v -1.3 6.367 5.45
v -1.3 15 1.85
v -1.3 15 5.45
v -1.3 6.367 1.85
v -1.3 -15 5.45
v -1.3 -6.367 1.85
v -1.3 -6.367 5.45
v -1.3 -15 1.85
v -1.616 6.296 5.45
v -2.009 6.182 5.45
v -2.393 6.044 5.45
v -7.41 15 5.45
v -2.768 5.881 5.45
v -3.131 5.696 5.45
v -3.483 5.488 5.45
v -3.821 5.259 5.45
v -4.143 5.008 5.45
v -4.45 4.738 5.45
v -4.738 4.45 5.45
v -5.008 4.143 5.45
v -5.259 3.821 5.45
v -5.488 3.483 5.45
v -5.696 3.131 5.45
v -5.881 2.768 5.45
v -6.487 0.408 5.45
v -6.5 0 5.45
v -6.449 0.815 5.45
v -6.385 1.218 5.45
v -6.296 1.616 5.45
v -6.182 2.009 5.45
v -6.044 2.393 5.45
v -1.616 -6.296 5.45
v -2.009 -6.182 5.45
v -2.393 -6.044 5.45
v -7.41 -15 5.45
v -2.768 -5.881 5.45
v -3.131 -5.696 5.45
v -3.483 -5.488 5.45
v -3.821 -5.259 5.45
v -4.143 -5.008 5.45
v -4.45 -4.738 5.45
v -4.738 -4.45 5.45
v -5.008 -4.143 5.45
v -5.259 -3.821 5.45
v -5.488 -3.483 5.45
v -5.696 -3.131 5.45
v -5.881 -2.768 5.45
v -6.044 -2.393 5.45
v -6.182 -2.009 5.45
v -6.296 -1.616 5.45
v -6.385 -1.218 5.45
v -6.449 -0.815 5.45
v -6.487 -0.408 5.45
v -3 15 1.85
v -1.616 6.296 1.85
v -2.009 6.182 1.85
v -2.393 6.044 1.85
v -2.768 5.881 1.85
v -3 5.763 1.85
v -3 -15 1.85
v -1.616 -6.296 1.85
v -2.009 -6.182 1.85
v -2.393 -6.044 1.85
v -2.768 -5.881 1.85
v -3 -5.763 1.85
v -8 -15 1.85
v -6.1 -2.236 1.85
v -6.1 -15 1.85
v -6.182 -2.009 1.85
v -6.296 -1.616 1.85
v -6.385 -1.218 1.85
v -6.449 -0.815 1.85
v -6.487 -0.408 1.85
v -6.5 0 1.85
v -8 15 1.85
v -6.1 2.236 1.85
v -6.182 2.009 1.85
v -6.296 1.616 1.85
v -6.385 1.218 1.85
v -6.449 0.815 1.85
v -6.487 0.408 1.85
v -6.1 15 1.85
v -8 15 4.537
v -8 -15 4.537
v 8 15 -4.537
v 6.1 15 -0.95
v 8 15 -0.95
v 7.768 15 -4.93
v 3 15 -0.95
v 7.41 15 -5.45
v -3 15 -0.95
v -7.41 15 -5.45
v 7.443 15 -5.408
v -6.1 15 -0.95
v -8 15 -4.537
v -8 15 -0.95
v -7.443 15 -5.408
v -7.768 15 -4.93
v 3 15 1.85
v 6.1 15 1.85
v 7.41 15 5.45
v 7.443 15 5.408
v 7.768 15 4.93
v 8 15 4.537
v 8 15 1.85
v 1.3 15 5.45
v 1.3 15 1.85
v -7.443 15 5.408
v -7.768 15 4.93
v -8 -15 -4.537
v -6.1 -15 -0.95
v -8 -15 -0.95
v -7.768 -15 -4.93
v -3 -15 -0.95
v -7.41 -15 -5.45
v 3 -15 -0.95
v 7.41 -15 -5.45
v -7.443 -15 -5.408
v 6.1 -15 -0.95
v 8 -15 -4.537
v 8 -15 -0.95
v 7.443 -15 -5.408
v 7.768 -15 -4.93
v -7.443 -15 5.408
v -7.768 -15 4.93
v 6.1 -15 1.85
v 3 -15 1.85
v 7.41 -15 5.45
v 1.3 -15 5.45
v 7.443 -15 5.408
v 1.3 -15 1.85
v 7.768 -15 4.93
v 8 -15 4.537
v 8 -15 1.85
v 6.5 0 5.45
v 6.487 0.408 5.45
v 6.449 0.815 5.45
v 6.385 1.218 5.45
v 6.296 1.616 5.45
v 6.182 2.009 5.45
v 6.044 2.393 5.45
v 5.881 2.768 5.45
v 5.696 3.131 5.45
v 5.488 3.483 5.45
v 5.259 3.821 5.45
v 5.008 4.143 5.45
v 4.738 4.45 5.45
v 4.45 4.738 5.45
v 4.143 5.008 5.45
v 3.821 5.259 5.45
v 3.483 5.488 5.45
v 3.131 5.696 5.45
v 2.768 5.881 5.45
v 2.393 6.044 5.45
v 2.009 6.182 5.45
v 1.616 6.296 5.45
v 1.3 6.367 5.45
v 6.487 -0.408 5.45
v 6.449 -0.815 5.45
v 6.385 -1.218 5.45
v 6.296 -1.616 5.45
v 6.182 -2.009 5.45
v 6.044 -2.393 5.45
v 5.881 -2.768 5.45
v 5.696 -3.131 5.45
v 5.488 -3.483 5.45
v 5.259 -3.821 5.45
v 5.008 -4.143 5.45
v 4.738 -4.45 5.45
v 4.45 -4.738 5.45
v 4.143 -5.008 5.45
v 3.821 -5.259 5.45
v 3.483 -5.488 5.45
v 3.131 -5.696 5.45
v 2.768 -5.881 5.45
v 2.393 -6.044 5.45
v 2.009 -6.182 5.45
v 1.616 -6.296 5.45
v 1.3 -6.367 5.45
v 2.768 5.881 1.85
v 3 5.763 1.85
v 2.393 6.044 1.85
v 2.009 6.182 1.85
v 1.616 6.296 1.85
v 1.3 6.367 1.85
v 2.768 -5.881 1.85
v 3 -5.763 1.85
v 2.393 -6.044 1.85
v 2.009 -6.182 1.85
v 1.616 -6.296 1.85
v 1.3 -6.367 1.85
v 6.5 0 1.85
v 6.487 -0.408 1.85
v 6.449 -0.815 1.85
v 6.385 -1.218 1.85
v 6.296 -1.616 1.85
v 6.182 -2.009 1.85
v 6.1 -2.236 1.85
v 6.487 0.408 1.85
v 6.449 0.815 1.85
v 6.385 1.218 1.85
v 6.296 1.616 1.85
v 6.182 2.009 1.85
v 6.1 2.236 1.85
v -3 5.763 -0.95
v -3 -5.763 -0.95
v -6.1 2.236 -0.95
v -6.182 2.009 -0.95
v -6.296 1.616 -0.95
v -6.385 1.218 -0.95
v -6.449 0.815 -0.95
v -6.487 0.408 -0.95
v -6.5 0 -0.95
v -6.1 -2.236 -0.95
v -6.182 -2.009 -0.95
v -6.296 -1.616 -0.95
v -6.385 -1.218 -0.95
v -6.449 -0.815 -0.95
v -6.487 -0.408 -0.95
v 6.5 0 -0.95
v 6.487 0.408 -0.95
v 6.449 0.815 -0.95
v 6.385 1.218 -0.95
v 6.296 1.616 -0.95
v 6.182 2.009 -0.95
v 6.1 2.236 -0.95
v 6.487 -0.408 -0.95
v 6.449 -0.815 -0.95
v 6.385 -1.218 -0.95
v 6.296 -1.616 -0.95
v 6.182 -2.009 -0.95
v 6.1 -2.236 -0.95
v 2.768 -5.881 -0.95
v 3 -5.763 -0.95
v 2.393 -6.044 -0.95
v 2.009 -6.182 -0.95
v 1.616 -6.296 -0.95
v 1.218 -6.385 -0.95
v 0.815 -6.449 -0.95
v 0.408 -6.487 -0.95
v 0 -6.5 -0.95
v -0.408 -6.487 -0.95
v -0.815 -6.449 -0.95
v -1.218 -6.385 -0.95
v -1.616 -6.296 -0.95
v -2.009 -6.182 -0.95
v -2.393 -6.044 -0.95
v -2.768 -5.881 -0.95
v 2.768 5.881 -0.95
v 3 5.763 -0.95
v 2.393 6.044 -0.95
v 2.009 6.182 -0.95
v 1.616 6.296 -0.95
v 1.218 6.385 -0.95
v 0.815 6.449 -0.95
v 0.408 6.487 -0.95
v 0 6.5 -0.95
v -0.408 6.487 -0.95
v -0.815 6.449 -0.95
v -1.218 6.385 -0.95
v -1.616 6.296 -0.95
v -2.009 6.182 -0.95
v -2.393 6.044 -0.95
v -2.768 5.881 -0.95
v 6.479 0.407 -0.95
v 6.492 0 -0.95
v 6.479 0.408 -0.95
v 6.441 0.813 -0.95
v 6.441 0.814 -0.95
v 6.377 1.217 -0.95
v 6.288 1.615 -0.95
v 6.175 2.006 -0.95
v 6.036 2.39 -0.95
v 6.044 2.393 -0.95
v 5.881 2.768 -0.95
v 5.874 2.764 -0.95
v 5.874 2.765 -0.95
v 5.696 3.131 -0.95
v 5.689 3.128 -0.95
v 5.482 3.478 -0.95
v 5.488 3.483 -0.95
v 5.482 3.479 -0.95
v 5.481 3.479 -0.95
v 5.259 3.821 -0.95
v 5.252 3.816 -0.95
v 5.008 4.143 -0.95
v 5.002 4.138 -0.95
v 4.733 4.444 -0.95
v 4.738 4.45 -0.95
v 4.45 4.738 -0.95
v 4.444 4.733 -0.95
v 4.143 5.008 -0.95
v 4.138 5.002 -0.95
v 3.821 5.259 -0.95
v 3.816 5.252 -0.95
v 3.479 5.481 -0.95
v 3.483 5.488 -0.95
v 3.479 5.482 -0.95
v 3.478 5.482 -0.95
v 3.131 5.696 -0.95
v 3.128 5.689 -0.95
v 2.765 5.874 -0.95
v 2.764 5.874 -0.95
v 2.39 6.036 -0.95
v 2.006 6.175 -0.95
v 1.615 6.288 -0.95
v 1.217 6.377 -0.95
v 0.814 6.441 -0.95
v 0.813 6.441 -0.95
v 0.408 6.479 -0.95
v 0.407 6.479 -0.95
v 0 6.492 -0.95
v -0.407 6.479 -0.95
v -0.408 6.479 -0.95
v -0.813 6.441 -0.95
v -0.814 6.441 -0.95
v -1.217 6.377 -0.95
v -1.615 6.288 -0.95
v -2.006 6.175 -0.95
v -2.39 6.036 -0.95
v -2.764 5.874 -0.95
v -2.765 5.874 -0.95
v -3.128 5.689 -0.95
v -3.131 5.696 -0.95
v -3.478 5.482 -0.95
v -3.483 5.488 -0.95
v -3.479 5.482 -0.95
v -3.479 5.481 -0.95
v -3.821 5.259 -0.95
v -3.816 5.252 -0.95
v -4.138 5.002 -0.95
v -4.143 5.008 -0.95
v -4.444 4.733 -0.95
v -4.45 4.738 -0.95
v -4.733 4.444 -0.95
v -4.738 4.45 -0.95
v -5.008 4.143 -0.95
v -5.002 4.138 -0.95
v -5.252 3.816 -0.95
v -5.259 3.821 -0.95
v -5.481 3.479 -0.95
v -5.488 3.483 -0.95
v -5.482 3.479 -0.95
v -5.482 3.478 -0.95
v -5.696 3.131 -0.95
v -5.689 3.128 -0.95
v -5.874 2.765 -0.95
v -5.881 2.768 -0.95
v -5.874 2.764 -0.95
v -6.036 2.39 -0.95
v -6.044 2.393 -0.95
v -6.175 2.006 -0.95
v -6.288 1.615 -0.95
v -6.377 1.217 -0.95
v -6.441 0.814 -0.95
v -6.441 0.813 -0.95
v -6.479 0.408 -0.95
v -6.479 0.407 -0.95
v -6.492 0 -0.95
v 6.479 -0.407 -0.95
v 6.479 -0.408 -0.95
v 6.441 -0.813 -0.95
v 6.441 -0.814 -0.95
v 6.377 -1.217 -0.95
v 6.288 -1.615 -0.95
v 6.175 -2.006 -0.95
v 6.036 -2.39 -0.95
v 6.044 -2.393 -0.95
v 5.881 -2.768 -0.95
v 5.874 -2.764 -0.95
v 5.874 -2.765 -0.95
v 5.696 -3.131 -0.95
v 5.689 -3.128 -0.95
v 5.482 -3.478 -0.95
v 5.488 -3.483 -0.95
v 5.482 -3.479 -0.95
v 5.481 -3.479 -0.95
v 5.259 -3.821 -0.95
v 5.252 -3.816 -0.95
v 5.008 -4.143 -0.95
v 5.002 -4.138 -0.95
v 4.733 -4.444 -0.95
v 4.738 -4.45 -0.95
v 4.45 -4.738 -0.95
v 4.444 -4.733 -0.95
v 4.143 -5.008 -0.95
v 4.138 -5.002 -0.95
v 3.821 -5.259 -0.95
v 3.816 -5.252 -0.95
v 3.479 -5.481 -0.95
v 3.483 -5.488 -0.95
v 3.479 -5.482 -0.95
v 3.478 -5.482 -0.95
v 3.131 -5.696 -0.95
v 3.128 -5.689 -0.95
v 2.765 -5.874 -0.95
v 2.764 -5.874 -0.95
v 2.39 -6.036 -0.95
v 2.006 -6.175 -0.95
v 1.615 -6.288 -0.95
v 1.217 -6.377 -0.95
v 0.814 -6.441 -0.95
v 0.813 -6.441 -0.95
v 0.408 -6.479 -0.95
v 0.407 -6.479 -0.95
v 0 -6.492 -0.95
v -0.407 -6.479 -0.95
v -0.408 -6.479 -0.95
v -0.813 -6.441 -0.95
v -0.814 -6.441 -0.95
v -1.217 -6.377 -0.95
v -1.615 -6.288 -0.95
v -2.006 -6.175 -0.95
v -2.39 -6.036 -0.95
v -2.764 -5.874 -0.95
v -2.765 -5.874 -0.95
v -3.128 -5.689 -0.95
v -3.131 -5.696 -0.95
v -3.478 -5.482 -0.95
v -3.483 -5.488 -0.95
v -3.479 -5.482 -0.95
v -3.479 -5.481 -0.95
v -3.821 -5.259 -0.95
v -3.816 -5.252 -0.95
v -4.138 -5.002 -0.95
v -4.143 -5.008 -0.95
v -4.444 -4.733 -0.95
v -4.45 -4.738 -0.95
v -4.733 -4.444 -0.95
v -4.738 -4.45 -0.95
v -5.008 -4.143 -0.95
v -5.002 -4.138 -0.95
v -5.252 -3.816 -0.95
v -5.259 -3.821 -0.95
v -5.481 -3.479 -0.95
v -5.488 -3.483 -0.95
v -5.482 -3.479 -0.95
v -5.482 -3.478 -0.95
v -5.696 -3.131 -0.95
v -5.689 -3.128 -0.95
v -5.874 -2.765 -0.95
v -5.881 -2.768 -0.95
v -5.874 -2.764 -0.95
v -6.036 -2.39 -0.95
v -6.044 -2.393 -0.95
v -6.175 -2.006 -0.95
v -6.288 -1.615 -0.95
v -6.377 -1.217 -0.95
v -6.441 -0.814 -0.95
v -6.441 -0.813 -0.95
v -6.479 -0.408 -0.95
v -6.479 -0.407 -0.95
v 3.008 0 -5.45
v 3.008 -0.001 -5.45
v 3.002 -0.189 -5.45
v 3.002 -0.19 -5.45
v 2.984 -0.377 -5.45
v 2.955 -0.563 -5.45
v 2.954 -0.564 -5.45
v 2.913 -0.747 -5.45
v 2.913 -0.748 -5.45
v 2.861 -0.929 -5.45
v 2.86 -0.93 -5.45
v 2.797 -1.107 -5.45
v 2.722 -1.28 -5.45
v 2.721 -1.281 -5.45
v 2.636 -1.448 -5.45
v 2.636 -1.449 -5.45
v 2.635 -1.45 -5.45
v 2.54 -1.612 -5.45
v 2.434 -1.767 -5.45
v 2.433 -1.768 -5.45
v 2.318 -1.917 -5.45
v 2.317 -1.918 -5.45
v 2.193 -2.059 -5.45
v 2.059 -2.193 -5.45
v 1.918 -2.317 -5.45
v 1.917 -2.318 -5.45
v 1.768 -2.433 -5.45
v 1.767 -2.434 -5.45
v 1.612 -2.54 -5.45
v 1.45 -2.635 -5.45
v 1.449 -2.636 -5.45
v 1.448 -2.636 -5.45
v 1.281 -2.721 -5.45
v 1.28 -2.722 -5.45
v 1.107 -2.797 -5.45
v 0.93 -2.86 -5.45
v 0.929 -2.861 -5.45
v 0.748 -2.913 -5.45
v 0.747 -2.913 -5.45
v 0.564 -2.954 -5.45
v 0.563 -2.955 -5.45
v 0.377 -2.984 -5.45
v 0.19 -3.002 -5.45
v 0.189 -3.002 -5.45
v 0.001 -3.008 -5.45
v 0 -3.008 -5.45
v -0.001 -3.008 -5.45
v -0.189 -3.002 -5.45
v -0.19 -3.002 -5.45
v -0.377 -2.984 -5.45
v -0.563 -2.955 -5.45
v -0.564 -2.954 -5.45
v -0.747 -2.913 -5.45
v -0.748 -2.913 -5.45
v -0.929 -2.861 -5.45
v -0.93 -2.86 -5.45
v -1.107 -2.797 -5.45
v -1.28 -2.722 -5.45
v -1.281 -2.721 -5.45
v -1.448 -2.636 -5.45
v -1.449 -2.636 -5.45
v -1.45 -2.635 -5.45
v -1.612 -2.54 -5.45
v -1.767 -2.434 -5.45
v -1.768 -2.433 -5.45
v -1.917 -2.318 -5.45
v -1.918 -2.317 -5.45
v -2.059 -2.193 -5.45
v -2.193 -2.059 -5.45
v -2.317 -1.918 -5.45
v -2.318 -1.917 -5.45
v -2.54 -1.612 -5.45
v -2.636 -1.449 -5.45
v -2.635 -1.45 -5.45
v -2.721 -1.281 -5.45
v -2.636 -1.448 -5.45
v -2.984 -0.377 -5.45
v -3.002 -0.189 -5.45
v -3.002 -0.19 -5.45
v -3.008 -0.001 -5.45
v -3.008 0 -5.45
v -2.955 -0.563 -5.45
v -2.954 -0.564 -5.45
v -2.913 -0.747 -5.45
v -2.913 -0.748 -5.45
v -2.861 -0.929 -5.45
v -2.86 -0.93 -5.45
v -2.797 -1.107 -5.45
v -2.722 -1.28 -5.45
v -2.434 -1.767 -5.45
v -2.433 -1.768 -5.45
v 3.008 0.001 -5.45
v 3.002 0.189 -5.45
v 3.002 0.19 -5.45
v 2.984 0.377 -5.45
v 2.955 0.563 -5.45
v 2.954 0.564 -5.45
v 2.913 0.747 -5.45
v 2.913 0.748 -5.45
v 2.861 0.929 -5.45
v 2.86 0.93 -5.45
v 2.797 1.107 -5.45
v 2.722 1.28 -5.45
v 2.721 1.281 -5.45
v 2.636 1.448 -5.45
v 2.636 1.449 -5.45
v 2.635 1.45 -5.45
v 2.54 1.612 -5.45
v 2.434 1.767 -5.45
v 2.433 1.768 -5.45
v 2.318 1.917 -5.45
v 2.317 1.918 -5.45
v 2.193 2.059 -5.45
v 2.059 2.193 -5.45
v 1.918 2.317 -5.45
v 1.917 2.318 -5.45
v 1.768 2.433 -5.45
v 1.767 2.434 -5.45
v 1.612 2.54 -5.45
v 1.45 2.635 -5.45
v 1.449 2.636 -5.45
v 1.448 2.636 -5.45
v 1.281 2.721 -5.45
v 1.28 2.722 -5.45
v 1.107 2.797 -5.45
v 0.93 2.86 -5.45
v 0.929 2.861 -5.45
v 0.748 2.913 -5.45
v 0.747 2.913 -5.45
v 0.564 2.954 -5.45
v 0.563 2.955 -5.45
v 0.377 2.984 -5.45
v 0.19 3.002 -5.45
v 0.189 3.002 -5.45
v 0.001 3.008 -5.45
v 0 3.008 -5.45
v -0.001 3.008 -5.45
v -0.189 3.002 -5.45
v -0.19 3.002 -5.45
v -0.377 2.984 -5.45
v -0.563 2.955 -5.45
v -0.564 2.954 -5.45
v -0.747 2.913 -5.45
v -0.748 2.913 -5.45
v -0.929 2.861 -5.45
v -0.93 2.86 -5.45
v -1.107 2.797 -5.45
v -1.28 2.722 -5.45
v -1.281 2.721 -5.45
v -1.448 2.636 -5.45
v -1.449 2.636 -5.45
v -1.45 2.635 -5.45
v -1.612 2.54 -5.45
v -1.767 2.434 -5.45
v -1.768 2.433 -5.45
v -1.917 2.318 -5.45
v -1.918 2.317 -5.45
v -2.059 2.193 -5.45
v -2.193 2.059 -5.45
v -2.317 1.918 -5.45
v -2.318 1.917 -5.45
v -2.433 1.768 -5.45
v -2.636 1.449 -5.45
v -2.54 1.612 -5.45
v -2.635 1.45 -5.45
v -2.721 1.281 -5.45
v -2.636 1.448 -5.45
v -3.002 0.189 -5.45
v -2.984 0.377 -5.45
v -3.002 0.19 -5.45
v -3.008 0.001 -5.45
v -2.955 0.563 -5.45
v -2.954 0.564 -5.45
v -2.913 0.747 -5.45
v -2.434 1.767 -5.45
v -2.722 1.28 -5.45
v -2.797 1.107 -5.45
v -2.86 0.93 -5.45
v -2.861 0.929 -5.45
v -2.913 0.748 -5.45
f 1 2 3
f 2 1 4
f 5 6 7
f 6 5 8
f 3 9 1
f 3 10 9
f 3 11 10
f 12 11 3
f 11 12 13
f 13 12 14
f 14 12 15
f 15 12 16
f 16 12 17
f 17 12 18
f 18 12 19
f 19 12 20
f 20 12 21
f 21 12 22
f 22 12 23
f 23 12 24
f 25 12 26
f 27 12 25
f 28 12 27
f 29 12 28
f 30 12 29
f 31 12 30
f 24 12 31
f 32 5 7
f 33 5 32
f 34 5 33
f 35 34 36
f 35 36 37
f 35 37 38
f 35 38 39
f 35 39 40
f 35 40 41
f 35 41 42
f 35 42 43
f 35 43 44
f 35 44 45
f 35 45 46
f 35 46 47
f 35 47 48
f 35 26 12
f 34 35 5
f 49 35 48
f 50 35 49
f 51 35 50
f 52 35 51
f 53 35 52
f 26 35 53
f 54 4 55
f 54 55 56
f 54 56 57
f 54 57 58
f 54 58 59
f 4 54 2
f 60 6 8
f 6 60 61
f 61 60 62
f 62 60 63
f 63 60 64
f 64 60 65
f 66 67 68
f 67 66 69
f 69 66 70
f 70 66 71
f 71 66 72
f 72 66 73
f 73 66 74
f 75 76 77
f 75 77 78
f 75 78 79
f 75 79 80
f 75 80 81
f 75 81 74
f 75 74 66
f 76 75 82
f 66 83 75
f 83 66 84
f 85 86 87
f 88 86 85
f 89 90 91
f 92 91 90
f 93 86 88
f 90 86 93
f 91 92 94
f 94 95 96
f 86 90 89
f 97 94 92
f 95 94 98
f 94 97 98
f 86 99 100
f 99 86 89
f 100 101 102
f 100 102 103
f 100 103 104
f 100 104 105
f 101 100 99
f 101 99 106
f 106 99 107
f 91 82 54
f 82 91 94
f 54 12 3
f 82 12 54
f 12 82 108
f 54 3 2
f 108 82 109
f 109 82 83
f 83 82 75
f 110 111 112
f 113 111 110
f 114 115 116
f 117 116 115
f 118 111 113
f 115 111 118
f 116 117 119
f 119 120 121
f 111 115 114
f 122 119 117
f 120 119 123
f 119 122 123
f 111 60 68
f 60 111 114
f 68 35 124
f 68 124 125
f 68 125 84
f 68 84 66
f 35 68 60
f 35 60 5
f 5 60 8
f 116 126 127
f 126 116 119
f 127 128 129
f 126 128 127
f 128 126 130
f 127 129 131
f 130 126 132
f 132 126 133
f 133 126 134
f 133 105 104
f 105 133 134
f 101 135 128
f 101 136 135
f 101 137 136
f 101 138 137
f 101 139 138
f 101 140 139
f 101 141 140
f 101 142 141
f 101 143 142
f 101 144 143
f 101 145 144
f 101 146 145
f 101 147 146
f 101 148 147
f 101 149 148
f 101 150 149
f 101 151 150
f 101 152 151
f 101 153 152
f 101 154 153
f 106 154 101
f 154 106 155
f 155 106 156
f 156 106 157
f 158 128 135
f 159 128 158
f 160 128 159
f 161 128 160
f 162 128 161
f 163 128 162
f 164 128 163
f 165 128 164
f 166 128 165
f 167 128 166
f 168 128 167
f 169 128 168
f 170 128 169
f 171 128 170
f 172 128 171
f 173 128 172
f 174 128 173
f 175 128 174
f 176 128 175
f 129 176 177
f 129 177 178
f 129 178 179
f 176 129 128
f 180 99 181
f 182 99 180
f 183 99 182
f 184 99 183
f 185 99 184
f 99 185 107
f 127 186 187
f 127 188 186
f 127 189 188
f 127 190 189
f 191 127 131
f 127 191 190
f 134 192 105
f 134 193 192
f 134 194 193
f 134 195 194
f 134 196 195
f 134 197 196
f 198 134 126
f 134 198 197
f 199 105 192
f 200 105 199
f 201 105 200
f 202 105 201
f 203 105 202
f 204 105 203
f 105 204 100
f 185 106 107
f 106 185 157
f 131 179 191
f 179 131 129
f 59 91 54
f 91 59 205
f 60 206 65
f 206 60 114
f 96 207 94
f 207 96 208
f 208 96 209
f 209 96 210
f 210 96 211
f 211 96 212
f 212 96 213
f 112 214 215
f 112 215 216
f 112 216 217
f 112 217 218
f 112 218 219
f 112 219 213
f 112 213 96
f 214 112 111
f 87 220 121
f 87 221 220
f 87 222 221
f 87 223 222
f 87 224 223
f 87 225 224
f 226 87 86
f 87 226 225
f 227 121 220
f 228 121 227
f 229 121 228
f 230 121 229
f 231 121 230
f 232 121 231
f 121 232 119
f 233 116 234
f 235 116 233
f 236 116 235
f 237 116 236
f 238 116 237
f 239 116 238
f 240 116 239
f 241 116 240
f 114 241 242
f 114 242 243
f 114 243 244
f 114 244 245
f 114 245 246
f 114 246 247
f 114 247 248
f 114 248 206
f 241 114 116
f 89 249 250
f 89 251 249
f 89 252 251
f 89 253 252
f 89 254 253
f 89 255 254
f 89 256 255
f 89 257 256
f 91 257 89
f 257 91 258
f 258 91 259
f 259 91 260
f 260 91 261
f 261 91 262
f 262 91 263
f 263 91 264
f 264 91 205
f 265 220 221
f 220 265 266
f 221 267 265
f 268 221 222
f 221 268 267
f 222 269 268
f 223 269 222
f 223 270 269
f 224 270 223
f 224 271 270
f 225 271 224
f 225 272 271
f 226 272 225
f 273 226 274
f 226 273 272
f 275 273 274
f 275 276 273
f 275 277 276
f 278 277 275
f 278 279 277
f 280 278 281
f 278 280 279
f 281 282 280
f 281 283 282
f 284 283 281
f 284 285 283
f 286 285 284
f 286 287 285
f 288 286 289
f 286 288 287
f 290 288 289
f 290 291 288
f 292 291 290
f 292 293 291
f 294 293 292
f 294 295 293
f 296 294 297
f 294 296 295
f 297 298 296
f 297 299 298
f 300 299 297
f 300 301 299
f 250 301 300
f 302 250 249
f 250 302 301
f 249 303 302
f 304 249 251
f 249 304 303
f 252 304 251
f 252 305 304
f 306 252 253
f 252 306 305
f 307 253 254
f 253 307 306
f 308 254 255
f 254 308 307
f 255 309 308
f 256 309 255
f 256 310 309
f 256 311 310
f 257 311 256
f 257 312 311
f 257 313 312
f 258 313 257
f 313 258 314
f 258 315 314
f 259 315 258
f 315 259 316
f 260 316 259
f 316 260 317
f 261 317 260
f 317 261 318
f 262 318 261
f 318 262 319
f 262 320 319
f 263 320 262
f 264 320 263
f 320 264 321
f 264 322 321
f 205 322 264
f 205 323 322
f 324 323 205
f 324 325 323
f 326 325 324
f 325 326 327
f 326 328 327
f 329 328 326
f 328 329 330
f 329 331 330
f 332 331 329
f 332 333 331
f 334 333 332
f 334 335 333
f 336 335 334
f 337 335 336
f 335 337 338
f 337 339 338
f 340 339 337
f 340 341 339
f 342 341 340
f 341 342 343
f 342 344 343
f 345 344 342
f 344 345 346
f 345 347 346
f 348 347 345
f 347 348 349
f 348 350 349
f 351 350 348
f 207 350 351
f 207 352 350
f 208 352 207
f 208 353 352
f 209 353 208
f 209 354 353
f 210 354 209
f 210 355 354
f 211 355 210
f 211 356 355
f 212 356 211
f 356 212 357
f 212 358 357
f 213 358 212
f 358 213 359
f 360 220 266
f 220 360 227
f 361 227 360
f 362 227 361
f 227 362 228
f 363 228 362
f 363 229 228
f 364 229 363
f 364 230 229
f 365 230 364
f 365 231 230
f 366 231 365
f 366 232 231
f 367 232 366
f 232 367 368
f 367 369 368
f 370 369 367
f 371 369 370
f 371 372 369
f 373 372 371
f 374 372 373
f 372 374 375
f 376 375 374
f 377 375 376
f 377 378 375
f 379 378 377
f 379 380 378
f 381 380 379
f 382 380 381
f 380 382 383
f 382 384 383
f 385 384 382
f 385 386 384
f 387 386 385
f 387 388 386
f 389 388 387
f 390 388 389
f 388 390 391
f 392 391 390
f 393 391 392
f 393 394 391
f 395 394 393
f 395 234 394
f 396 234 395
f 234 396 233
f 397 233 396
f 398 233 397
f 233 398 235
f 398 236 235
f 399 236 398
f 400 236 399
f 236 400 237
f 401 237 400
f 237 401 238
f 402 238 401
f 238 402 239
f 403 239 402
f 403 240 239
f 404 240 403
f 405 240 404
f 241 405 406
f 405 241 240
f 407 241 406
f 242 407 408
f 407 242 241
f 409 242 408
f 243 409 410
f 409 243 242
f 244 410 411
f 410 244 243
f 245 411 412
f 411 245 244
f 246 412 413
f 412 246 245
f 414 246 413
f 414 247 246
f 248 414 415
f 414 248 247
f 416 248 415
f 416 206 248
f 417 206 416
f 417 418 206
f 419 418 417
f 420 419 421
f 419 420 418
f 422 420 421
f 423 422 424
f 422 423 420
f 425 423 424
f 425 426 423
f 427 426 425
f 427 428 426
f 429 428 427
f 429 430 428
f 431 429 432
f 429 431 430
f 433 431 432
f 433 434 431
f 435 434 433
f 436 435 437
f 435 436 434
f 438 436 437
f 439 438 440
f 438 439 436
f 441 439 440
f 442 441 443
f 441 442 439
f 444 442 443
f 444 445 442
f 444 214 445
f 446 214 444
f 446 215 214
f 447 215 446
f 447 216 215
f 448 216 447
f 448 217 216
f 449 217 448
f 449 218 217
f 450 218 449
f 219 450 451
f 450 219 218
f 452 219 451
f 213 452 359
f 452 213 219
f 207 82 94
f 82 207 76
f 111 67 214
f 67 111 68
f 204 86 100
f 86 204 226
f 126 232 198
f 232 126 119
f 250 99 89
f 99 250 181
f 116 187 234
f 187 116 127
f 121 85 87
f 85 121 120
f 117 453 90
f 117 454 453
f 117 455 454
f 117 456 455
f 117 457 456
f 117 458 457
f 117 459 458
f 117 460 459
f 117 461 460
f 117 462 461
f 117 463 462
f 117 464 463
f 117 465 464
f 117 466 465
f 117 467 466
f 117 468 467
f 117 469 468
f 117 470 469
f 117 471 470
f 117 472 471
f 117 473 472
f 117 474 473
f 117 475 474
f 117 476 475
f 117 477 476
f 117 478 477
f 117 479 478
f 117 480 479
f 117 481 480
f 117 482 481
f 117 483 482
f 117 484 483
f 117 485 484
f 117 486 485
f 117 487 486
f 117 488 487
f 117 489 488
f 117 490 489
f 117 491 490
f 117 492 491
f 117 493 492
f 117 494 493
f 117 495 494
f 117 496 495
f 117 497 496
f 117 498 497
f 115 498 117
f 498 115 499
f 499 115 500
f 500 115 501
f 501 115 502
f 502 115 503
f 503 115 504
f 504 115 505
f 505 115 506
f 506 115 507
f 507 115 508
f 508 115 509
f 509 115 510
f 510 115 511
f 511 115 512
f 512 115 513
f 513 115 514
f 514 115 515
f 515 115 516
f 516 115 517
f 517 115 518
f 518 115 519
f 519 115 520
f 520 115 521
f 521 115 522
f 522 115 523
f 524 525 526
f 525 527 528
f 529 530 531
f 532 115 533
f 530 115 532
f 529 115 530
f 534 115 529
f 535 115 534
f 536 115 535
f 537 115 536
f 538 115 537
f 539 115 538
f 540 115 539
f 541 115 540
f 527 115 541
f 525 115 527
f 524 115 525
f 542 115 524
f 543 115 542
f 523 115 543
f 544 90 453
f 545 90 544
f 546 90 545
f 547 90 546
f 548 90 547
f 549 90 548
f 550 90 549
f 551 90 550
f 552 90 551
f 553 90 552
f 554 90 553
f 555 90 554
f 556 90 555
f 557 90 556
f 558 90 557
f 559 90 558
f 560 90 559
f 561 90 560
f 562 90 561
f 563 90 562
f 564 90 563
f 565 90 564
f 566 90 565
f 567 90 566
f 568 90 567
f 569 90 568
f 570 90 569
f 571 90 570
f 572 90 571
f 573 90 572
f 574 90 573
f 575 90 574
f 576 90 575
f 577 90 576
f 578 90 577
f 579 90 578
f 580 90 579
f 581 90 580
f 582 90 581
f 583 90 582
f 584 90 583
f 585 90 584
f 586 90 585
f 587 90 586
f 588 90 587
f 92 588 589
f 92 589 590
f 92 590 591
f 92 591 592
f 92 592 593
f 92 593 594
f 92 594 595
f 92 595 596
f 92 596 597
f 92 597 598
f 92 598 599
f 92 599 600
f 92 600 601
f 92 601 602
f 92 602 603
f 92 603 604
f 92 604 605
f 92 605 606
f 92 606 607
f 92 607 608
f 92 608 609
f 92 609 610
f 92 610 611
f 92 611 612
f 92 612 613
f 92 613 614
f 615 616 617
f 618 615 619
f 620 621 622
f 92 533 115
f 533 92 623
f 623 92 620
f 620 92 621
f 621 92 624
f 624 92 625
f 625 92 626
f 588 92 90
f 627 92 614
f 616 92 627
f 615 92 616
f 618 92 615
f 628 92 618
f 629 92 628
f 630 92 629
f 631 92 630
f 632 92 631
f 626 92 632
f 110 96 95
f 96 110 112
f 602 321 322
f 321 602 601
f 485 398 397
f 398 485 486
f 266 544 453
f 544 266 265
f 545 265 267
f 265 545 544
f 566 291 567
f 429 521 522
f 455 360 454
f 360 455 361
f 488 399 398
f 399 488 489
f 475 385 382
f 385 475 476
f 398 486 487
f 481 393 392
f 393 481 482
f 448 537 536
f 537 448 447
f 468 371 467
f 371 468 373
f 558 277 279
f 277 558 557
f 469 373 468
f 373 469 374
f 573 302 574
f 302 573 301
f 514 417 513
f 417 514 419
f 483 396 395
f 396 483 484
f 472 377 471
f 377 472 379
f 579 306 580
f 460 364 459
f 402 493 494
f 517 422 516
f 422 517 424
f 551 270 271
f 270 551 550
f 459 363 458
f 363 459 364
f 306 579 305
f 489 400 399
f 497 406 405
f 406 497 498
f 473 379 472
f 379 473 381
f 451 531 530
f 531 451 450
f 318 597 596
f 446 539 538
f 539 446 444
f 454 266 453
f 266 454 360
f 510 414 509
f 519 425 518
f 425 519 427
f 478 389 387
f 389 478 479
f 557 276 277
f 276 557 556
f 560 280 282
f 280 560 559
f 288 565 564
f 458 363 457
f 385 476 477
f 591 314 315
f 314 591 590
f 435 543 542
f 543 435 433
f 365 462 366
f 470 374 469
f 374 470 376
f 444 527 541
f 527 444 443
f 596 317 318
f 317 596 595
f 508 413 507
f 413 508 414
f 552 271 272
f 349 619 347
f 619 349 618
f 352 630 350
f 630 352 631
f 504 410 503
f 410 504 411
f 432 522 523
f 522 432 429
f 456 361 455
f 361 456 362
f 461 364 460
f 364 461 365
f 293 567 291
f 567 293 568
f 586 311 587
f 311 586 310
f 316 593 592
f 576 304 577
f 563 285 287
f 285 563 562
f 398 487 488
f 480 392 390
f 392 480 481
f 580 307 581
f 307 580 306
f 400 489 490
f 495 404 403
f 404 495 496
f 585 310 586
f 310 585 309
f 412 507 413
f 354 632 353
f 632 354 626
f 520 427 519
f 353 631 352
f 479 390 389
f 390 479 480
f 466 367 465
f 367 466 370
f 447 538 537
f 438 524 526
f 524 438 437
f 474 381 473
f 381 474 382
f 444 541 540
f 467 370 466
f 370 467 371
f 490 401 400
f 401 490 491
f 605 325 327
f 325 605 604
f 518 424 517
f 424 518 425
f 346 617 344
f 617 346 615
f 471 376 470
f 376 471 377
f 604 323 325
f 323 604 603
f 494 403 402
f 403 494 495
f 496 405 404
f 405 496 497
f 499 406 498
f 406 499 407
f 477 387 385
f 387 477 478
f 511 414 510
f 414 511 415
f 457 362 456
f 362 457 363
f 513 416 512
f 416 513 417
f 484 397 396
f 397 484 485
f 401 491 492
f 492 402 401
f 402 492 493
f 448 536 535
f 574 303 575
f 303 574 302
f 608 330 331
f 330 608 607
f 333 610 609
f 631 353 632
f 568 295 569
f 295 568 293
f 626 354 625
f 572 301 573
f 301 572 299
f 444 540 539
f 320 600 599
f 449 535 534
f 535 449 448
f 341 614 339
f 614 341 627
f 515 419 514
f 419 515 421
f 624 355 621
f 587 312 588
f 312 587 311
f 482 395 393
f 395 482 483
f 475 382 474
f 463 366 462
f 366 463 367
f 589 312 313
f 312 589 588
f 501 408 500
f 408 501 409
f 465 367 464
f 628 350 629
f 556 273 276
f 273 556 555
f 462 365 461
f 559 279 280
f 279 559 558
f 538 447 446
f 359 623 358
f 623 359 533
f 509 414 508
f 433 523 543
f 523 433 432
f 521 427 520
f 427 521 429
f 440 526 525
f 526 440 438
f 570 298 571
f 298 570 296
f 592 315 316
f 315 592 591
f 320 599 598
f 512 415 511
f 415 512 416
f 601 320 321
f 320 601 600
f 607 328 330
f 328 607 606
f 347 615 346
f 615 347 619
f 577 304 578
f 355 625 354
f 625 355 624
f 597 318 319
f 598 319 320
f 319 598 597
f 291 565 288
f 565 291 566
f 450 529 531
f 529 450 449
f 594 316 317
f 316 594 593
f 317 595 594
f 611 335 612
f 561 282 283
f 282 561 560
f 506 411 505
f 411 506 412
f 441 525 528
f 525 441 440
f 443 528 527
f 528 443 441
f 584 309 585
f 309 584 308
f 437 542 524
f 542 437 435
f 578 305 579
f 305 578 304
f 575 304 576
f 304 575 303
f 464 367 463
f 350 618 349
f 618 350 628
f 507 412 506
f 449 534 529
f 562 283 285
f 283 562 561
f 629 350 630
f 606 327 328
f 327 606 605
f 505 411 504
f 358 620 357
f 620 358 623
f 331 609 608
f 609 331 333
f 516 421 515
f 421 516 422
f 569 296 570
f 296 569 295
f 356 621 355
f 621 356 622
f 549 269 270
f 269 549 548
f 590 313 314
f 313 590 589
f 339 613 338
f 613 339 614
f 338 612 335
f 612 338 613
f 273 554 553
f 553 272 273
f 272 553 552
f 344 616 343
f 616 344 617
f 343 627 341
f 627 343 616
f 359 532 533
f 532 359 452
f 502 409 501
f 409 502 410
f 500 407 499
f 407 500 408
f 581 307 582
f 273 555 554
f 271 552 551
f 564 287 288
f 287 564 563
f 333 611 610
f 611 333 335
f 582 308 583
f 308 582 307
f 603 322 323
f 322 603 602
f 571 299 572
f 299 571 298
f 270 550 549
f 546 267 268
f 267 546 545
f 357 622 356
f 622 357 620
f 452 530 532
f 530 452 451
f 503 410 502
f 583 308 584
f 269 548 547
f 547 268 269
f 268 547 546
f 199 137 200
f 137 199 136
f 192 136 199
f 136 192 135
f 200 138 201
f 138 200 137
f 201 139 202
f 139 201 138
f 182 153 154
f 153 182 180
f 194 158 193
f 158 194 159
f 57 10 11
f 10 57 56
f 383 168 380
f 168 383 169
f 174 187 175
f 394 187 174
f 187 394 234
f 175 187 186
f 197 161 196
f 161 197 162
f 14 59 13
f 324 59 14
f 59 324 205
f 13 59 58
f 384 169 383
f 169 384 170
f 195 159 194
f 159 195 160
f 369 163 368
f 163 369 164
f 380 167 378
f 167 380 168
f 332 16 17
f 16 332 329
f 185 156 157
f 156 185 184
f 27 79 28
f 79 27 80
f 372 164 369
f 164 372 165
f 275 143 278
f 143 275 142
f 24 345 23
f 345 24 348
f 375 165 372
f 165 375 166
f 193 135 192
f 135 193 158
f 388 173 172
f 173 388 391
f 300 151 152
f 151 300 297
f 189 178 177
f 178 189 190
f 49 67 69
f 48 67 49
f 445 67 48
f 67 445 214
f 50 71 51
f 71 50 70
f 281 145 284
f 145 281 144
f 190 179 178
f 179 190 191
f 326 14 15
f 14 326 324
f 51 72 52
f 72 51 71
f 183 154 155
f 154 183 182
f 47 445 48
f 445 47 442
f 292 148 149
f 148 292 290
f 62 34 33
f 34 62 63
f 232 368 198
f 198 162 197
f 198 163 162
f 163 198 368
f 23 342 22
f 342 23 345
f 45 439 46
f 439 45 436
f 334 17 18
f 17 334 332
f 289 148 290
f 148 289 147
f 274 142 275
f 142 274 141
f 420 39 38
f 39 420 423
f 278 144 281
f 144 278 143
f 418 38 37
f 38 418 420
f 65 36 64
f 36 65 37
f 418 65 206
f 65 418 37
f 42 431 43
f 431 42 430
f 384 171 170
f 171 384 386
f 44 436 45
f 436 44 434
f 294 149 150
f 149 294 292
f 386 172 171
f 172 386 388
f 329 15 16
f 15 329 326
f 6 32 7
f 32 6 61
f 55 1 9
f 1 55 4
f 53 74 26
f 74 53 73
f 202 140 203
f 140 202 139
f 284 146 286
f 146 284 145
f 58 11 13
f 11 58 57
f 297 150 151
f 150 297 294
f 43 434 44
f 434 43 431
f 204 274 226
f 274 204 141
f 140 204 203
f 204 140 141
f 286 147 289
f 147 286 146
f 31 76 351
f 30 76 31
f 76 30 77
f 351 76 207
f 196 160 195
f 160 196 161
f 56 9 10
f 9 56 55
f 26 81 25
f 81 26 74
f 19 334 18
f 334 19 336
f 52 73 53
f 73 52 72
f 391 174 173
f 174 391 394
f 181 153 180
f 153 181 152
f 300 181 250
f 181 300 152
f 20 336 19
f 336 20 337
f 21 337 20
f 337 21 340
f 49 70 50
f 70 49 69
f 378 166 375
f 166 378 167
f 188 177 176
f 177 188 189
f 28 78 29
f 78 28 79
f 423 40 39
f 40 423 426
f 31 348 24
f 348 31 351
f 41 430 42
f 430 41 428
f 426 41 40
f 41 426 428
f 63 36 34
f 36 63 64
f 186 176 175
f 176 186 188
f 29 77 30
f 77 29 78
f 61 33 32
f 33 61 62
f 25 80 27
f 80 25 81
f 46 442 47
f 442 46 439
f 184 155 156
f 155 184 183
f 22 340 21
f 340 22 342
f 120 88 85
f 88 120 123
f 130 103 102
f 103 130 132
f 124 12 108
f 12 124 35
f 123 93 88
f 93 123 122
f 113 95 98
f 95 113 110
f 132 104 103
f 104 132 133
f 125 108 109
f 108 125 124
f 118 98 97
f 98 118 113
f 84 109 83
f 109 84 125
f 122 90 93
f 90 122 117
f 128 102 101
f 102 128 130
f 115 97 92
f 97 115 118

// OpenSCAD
top_width=6.7;
top_height=3.6;
top_separation=2.6;
middle_width=3.1;
middle_height=2.8;
middle_separation=6;
bottom_width=16;
bottom_height=4.5;

length=30;

hole_diameter=6;
countersink_diameter=13;
$fn=100;

intersection(){
translate([0,0,-(bottom_height+middle_height+top_height)/2])
difference(){
solid_adapter();
translate([0,0,-0.01])
cylinder(d1=hole_diameter,d2=countersink_diameter,h=bottom_height+0.02);
translate([0,0,bottom_height])
cylinder(d=countersink_diameter,h=middle_height+top_height+0.01);
}
translate([0,length/2,0])
rotate([90,0,0])
cylinder(d=bottom_width*1.15,h=length);
}

module solid_adapter(){
translate([0,-length/2,0])
union(){
translate([-top_width-top_separation/2,0,middle_height+bottom_height])
cube([top_width,length,top_height]);
translate([top_separation/2,0,middle_height+bottom_height])
cube([top_width,length,top_height]);

translate([-middle_width-middle_separation/2,0,bottom_height])
cube([middle_width,length,middle_height]);
translate([middle_separation/2,0,bottom_height])
cube([middle_width,length,middle_height]);

translate([-bottom_width/2,0,0])
cube([bottom_width,length,bottom_height]);
}
}
